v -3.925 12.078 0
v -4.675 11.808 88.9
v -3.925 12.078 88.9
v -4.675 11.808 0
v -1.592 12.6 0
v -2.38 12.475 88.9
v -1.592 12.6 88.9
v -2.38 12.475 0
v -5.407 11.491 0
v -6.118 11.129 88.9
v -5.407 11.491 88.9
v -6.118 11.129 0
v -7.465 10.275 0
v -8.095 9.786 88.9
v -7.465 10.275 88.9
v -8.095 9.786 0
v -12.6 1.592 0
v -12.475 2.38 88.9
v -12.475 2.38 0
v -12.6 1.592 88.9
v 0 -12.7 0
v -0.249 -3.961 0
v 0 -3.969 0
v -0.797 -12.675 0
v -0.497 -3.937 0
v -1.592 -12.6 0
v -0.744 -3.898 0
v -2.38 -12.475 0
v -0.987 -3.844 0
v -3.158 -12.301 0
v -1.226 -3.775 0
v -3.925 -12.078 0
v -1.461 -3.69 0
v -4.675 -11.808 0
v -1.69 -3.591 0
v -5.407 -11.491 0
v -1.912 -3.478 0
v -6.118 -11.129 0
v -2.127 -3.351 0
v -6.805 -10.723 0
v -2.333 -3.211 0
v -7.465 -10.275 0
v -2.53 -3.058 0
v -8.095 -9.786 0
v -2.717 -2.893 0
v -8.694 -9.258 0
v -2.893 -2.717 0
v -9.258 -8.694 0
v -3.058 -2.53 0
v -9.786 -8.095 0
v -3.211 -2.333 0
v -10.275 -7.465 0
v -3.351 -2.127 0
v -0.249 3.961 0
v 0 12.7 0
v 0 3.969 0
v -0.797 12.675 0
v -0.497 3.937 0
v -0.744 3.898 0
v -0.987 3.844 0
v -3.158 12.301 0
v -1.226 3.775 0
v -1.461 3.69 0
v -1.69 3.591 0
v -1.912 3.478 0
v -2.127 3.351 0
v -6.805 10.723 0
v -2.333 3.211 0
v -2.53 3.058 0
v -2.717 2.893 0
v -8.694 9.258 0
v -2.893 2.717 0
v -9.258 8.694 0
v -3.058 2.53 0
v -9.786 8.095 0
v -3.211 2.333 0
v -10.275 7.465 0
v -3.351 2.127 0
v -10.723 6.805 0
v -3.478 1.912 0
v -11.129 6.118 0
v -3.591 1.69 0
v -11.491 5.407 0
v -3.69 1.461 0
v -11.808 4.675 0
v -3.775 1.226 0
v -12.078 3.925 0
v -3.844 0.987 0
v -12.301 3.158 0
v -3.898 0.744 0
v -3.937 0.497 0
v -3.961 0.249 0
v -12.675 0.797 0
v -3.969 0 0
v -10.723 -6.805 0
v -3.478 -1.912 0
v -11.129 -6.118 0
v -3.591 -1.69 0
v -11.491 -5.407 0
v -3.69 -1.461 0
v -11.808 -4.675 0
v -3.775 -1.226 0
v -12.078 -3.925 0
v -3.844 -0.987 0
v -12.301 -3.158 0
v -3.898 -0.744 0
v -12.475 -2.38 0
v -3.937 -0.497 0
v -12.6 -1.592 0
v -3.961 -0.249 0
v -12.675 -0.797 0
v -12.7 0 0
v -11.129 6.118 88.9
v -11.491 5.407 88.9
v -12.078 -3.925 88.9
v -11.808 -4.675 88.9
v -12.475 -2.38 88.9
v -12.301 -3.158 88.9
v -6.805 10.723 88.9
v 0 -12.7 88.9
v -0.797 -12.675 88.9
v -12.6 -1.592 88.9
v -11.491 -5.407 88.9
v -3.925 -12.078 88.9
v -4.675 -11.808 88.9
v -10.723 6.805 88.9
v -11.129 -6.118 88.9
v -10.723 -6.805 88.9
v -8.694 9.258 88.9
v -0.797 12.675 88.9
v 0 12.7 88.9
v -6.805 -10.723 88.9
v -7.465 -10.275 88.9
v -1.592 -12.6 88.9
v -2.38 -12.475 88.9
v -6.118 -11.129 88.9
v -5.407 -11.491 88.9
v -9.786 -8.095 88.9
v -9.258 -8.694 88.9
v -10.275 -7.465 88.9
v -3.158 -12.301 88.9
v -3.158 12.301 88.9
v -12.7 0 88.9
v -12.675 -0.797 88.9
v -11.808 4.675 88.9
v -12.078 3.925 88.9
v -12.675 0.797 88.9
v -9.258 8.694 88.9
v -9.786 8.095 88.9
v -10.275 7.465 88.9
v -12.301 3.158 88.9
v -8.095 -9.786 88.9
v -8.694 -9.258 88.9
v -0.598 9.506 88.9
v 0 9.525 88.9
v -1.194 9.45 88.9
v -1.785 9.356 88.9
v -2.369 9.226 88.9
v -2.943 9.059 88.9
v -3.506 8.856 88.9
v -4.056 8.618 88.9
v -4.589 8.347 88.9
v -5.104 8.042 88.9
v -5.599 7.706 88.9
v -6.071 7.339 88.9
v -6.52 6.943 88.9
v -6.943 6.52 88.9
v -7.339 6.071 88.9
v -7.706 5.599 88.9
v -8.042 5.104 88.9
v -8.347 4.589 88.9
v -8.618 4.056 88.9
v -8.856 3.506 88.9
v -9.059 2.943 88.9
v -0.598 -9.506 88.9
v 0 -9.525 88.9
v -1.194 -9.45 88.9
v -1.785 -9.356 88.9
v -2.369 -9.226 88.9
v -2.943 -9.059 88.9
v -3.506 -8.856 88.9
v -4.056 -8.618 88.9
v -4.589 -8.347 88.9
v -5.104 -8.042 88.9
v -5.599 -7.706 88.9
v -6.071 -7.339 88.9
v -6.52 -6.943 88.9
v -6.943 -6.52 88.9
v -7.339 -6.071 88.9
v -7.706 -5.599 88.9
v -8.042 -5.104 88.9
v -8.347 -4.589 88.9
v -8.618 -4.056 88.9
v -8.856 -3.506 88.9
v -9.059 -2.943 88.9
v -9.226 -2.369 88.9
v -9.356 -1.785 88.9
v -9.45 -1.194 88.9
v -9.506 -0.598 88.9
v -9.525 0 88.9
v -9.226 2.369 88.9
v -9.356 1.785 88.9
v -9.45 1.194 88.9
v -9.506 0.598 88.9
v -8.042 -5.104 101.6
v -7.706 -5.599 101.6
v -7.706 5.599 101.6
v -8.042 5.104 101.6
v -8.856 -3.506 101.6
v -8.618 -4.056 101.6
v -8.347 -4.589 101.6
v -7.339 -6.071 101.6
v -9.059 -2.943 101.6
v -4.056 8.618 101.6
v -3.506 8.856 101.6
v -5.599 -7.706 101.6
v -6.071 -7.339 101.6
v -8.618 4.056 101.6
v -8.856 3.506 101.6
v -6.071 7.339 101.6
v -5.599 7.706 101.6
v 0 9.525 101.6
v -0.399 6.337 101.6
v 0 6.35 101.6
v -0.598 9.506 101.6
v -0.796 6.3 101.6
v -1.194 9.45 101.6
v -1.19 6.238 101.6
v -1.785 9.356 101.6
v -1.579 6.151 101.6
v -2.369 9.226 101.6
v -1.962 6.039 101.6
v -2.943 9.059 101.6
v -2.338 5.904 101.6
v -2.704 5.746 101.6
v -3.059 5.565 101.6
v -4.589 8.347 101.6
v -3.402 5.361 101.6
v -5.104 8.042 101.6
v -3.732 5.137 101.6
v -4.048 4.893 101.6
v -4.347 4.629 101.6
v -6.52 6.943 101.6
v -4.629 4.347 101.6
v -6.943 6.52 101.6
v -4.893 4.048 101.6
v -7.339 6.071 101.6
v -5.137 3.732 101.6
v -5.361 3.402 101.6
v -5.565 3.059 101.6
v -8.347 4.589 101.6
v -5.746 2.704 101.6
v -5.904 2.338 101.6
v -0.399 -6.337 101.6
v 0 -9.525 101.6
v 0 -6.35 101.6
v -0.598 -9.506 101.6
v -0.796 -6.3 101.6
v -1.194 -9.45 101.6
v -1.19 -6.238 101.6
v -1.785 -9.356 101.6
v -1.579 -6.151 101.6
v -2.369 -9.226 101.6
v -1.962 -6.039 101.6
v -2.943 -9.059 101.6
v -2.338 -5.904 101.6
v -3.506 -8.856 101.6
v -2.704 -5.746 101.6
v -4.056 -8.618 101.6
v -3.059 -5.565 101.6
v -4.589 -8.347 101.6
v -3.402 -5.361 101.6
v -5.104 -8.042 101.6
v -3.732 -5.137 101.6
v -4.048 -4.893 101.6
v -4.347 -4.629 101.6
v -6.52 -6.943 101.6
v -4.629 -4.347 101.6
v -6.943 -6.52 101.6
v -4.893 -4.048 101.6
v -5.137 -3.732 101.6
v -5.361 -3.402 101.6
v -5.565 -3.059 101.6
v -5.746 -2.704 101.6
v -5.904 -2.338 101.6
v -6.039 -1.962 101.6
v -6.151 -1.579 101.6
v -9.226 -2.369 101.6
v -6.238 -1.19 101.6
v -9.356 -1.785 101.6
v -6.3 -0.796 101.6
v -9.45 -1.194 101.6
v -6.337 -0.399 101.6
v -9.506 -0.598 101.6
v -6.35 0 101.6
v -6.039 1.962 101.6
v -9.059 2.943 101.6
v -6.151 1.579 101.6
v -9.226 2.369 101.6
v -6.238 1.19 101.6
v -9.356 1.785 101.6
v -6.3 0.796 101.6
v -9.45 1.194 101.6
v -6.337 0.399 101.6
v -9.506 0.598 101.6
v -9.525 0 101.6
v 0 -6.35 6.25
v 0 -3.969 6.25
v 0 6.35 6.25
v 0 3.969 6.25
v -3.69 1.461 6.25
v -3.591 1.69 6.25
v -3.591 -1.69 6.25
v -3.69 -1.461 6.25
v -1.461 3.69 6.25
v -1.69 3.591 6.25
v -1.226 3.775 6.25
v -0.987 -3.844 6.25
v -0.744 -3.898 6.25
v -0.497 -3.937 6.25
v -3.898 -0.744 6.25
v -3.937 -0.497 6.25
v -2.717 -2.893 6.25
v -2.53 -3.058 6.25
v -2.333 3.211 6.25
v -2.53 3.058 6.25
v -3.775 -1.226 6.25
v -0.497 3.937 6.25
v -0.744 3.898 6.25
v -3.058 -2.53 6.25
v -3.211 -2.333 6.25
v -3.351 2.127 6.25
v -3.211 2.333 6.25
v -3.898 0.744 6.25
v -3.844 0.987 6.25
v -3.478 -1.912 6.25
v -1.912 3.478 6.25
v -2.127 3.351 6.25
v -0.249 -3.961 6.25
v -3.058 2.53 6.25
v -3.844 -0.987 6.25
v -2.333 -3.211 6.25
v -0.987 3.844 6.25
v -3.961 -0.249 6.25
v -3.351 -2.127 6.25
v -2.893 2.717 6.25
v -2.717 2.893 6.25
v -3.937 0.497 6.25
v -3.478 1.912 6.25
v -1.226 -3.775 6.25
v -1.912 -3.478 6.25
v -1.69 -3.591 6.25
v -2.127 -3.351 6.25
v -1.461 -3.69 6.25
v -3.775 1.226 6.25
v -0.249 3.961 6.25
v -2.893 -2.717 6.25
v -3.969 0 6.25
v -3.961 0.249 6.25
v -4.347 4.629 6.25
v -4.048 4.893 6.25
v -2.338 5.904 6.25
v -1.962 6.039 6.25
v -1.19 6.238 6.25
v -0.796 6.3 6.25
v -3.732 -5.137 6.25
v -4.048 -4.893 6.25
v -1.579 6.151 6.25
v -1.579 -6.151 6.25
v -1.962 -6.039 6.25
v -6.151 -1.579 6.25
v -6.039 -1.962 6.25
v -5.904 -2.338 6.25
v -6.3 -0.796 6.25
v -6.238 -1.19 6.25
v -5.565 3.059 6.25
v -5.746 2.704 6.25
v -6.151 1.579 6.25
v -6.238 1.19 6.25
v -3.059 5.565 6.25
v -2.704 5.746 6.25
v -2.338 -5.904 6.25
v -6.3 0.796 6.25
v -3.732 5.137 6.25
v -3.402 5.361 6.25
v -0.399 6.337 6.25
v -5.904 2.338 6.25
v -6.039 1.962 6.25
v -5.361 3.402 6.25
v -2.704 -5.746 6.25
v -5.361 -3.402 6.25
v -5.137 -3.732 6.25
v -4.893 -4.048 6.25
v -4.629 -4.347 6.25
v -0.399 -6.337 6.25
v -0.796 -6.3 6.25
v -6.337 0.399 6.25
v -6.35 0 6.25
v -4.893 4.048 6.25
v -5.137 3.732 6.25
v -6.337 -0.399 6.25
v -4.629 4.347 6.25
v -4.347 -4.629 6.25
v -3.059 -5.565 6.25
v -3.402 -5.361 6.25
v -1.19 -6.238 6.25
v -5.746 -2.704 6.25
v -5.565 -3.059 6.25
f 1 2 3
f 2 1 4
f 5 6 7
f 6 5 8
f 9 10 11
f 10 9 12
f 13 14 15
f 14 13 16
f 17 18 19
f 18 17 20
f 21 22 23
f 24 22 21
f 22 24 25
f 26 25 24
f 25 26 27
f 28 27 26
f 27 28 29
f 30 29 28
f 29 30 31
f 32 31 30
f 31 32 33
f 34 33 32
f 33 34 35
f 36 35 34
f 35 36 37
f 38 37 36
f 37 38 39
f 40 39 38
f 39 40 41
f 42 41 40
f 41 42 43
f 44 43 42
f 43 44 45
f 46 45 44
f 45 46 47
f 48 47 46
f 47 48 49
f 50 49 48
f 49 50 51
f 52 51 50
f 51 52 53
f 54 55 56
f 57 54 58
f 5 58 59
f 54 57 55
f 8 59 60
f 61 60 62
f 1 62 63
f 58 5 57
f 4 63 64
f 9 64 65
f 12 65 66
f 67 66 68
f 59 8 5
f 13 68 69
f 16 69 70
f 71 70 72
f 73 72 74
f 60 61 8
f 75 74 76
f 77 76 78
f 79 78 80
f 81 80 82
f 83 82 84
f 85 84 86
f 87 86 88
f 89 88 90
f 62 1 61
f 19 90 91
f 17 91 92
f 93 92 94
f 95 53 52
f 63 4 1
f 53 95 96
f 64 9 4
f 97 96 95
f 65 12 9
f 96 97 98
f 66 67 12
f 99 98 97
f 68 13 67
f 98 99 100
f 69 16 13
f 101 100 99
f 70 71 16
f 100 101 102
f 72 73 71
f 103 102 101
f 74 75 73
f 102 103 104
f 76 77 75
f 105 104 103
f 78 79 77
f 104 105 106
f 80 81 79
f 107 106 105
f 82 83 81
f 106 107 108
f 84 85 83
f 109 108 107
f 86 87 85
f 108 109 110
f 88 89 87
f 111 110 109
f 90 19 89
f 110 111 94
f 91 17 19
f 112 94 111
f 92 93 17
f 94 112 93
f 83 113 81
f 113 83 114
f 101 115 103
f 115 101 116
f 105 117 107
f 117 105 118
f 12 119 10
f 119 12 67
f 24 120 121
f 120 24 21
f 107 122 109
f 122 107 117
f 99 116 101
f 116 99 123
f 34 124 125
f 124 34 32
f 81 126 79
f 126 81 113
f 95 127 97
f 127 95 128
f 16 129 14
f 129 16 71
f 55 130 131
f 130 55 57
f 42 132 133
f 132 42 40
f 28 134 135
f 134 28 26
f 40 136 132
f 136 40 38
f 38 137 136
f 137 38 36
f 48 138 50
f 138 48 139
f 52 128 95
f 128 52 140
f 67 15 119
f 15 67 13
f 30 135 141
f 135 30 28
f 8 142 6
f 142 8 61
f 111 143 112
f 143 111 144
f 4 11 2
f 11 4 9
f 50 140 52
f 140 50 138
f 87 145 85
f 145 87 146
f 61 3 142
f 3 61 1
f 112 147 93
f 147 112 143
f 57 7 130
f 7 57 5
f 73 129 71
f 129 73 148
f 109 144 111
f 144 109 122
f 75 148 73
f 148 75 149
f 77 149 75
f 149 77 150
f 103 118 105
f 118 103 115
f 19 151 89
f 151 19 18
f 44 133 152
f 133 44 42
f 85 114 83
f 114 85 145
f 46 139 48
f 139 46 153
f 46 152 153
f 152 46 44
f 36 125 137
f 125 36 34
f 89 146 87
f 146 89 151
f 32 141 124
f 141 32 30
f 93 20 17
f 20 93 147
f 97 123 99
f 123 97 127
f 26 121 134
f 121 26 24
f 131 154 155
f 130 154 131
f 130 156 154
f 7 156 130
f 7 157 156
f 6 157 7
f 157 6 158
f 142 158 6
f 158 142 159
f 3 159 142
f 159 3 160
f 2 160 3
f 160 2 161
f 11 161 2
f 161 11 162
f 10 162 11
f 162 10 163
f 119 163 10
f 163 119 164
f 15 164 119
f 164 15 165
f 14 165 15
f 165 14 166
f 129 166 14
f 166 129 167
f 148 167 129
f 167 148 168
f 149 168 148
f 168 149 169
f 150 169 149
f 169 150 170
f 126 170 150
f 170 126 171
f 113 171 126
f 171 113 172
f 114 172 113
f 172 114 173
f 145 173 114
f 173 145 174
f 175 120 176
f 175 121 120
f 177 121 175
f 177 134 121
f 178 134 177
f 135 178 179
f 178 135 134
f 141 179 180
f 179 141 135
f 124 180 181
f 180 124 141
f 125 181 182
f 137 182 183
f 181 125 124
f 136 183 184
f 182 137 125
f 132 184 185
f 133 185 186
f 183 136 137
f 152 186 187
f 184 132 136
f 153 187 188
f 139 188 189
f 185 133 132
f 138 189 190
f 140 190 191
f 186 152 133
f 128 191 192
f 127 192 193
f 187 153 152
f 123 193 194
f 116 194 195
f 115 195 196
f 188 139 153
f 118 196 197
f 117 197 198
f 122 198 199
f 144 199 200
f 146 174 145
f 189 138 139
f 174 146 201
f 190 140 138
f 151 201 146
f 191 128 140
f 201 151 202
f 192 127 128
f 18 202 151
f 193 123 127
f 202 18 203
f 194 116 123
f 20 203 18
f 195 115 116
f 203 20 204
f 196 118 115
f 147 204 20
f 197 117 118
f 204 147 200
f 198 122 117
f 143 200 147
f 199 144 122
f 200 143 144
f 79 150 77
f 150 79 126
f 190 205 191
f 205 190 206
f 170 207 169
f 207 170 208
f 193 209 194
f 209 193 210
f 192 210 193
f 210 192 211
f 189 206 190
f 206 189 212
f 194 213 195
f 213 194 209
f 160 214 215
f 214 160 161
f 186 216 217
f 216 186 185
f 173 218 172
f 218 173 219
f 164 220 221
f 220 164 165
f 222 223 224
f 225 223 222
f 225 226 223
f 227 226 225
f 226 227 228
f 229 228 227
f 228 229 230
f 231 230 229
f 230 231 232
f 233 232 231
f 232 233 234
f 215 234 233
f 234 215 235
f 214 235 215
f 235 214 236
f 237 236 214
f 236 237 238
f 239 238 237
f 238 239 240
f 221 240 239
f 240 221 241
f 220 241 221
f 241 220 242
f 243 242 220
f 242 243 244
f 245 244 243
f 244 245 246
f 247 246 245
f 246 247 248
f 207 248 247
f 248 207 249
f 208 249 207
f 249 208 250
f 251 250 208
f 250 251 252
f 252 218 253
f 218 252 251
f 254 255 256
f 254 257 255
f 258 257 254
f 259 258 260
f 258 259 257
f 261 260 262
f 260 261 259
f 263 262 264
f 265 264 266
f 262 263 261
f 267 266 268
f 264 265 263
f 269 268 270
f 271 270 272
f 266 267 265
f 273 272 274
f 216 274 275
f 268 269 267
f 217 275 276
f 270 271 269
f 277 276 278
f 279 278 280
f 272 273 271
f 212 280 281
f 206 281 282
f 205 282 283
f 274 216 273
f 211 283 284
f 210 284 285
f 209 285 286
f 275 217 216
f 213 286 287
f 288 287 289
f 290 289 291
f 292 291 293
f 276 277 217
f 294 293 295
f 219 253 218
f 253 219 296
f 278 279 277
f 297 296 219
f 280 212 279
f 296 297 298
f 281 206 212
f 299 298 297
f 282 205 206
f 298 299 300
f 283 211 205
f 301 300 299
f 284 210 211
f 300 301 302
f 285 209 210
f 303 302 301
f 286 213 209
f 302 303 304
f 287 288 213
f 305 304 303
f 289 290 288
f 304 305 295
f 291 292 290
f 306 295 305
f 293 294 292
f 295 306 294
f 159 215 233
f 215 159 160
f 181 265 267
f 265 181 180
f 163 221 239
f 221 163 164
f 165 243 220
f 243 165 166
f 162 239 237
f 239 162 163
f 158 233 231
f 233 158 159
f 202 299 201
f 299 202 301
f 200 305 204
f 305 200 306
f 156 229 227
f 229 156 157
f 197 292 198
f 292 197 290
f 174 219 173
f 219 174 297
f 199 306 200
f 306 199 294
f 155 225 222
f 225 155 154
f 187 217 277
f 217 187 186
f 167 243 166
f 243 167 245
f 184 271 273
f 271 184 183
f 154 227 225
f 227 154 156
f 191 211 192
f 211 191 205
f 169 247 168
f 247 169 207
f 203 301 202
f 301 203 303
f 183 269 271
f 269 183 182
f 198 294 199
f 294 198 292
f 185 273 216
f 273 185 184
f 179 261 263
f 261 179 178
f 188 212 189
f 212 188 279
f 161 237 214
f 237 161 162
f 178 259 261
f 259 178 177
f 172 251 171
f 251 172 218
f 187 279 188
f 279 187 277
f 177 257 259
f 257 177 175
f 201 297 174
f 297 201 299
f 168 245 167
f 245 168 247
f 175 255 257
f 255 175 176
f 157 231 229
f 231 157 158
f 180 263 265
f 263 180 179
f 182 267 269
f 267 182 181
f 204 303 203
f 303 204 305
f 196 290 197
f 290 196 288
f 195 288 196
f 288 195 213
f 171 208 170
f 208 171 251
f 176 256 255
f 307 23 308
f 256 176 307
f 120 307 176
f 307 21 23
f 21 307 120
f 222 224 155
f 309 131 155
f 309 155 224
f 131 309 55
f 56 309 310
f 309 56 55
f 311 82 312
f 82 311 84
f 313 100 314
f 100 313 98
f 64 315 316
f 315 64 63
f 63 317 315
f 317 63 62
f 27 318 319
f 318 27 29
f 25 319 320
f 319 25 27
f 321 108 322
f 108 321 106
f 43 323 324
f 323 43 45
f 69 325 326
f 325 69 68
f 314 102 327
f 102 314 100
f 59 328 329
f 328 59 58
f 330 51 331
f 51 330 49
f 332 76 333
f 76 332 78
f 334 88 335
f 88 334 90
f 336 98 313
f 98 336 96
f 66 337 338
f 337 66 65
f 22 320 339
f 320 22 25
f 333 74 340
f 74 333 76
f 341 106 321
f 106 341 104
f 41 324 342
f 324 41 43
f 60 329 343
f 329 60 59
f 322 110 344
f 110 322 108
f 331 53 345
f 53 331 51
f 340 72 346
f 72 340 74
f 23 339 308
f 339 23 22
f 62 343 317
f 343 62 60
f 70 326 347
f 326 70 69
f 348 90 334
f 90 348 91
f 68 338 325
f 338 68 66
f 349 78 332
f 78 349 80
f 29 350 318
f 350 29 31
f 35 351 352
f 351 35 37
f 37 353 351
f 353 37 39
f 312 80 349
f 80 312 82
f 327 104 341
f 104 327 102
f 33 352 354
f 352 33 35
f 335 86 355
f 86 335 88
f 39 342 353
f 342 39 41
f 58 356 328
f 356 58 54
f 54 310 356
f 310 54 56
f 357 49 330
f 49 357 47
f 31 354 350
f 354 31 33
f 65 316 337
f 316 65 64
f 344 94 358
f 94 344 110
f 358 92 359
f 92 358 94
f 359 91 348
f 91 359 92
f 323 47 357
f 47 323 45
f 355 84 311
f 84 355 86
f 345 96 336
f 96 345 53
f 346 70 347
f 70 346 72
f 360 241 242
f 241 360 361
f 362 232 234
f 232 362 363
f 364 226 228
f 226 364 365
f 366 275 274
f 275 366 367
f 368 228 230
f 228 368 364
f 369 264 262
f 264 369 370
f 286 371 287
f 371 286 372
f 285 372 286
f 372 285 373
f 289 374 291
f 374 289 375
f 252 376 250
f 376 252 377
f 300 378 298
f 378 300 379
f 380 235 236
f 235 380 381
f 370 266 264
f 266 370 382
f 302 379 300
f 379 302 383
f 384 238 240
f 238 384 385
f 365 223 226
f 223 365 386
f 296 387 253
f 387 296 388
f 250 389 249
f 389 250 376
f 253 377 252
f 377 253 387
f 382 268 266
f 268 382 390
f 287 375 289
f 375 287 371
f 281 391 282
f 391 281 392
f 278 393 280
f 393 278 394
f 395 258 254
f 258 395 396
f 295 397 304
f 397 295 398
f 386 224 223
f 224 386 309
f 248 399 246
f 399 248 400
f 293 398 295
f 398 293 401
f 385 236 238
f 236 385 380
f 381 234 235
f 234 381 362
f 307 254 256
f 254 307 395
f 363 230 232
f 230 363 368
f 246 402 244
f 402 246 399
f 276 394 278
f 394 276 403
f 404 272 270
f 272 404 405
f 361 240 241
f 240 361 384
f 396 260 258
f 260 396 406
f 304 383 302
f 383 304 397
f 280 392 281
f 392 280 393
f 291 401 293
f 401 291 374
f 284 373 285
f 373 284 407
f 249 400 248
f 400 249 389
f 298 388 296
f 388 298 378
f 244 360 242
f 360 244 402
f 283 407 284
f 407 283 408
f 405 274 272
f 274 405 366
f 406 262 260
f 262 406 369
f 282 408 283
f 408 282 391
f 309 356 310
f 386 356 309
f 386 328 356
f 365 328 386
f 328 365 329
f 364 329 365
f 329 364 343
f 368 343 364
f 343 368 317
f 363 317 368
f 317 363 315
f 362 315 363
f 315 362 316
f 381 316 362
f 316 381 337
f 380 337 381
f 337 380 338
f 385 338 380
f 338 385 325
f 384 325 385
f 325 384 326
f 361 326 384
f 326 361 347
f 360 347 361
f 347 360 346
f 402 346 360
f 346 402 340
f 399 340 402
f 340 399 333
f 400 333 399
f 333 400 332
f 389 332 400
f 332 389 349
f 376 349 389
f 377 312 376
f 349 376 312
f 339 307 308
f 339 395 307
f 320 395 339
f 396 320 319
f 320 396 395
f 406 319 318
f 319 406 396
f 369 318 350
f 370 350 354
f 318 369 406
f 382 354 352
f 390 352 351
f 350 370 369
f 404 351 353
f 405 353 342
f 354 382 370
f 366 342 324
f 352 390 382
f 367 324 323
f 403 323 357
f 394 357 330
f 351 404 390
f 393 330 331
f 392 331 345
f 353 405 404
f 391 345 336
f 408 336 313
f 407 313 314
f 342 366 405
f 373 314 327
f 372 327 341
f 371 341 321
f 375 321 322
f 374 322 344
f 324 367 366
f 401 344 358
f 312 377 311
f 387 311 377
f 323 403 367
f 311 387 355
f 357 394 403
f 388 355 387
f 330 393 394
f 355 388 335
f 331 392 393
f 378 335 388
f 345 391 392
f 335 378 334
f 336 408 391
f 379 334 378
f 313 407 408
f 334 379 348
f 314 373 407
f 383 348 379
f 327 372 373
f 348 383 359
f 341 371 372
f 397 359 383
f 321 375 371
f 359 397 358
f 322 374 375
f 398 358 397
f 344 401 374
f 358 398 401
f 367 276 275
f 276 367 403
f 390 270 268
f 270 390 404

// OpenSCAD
// Units in INCHES

OD = 25.4*1;				//Outside Diameter
OL = 25.4*4;				//Overall Length
ID = 25.4*1/2;				//Large Inner Diameter
TD = 25.4*5/16;			//Throat Diameter
IL = 25.4*2.8;				//Internal Length
TL = 25.4*0.25;			//Throat Length
TrD= 25.4*3/4;				//Thread Outer Diameter
TrL= 25.4*0.5;				//Thread Length

difference() {
	union() {
		cylinder(d=OD, h=OL-TrL, $fn=100);
		translate([0,0,OL-TrL]) cylinder(d=TrD, h=TrL, $fn=100);
	}
	translate([0,-OD/2,-0.1]) cube(size = [OD,OD,OL+.2]);
	translate([0,0,-0.1]) cylinder(d=TD, h=TL+.2, $fn=100);
	translate([0,0,TL-0.1]) cylinder(d=ID, h=OL, $fn=100);
}
